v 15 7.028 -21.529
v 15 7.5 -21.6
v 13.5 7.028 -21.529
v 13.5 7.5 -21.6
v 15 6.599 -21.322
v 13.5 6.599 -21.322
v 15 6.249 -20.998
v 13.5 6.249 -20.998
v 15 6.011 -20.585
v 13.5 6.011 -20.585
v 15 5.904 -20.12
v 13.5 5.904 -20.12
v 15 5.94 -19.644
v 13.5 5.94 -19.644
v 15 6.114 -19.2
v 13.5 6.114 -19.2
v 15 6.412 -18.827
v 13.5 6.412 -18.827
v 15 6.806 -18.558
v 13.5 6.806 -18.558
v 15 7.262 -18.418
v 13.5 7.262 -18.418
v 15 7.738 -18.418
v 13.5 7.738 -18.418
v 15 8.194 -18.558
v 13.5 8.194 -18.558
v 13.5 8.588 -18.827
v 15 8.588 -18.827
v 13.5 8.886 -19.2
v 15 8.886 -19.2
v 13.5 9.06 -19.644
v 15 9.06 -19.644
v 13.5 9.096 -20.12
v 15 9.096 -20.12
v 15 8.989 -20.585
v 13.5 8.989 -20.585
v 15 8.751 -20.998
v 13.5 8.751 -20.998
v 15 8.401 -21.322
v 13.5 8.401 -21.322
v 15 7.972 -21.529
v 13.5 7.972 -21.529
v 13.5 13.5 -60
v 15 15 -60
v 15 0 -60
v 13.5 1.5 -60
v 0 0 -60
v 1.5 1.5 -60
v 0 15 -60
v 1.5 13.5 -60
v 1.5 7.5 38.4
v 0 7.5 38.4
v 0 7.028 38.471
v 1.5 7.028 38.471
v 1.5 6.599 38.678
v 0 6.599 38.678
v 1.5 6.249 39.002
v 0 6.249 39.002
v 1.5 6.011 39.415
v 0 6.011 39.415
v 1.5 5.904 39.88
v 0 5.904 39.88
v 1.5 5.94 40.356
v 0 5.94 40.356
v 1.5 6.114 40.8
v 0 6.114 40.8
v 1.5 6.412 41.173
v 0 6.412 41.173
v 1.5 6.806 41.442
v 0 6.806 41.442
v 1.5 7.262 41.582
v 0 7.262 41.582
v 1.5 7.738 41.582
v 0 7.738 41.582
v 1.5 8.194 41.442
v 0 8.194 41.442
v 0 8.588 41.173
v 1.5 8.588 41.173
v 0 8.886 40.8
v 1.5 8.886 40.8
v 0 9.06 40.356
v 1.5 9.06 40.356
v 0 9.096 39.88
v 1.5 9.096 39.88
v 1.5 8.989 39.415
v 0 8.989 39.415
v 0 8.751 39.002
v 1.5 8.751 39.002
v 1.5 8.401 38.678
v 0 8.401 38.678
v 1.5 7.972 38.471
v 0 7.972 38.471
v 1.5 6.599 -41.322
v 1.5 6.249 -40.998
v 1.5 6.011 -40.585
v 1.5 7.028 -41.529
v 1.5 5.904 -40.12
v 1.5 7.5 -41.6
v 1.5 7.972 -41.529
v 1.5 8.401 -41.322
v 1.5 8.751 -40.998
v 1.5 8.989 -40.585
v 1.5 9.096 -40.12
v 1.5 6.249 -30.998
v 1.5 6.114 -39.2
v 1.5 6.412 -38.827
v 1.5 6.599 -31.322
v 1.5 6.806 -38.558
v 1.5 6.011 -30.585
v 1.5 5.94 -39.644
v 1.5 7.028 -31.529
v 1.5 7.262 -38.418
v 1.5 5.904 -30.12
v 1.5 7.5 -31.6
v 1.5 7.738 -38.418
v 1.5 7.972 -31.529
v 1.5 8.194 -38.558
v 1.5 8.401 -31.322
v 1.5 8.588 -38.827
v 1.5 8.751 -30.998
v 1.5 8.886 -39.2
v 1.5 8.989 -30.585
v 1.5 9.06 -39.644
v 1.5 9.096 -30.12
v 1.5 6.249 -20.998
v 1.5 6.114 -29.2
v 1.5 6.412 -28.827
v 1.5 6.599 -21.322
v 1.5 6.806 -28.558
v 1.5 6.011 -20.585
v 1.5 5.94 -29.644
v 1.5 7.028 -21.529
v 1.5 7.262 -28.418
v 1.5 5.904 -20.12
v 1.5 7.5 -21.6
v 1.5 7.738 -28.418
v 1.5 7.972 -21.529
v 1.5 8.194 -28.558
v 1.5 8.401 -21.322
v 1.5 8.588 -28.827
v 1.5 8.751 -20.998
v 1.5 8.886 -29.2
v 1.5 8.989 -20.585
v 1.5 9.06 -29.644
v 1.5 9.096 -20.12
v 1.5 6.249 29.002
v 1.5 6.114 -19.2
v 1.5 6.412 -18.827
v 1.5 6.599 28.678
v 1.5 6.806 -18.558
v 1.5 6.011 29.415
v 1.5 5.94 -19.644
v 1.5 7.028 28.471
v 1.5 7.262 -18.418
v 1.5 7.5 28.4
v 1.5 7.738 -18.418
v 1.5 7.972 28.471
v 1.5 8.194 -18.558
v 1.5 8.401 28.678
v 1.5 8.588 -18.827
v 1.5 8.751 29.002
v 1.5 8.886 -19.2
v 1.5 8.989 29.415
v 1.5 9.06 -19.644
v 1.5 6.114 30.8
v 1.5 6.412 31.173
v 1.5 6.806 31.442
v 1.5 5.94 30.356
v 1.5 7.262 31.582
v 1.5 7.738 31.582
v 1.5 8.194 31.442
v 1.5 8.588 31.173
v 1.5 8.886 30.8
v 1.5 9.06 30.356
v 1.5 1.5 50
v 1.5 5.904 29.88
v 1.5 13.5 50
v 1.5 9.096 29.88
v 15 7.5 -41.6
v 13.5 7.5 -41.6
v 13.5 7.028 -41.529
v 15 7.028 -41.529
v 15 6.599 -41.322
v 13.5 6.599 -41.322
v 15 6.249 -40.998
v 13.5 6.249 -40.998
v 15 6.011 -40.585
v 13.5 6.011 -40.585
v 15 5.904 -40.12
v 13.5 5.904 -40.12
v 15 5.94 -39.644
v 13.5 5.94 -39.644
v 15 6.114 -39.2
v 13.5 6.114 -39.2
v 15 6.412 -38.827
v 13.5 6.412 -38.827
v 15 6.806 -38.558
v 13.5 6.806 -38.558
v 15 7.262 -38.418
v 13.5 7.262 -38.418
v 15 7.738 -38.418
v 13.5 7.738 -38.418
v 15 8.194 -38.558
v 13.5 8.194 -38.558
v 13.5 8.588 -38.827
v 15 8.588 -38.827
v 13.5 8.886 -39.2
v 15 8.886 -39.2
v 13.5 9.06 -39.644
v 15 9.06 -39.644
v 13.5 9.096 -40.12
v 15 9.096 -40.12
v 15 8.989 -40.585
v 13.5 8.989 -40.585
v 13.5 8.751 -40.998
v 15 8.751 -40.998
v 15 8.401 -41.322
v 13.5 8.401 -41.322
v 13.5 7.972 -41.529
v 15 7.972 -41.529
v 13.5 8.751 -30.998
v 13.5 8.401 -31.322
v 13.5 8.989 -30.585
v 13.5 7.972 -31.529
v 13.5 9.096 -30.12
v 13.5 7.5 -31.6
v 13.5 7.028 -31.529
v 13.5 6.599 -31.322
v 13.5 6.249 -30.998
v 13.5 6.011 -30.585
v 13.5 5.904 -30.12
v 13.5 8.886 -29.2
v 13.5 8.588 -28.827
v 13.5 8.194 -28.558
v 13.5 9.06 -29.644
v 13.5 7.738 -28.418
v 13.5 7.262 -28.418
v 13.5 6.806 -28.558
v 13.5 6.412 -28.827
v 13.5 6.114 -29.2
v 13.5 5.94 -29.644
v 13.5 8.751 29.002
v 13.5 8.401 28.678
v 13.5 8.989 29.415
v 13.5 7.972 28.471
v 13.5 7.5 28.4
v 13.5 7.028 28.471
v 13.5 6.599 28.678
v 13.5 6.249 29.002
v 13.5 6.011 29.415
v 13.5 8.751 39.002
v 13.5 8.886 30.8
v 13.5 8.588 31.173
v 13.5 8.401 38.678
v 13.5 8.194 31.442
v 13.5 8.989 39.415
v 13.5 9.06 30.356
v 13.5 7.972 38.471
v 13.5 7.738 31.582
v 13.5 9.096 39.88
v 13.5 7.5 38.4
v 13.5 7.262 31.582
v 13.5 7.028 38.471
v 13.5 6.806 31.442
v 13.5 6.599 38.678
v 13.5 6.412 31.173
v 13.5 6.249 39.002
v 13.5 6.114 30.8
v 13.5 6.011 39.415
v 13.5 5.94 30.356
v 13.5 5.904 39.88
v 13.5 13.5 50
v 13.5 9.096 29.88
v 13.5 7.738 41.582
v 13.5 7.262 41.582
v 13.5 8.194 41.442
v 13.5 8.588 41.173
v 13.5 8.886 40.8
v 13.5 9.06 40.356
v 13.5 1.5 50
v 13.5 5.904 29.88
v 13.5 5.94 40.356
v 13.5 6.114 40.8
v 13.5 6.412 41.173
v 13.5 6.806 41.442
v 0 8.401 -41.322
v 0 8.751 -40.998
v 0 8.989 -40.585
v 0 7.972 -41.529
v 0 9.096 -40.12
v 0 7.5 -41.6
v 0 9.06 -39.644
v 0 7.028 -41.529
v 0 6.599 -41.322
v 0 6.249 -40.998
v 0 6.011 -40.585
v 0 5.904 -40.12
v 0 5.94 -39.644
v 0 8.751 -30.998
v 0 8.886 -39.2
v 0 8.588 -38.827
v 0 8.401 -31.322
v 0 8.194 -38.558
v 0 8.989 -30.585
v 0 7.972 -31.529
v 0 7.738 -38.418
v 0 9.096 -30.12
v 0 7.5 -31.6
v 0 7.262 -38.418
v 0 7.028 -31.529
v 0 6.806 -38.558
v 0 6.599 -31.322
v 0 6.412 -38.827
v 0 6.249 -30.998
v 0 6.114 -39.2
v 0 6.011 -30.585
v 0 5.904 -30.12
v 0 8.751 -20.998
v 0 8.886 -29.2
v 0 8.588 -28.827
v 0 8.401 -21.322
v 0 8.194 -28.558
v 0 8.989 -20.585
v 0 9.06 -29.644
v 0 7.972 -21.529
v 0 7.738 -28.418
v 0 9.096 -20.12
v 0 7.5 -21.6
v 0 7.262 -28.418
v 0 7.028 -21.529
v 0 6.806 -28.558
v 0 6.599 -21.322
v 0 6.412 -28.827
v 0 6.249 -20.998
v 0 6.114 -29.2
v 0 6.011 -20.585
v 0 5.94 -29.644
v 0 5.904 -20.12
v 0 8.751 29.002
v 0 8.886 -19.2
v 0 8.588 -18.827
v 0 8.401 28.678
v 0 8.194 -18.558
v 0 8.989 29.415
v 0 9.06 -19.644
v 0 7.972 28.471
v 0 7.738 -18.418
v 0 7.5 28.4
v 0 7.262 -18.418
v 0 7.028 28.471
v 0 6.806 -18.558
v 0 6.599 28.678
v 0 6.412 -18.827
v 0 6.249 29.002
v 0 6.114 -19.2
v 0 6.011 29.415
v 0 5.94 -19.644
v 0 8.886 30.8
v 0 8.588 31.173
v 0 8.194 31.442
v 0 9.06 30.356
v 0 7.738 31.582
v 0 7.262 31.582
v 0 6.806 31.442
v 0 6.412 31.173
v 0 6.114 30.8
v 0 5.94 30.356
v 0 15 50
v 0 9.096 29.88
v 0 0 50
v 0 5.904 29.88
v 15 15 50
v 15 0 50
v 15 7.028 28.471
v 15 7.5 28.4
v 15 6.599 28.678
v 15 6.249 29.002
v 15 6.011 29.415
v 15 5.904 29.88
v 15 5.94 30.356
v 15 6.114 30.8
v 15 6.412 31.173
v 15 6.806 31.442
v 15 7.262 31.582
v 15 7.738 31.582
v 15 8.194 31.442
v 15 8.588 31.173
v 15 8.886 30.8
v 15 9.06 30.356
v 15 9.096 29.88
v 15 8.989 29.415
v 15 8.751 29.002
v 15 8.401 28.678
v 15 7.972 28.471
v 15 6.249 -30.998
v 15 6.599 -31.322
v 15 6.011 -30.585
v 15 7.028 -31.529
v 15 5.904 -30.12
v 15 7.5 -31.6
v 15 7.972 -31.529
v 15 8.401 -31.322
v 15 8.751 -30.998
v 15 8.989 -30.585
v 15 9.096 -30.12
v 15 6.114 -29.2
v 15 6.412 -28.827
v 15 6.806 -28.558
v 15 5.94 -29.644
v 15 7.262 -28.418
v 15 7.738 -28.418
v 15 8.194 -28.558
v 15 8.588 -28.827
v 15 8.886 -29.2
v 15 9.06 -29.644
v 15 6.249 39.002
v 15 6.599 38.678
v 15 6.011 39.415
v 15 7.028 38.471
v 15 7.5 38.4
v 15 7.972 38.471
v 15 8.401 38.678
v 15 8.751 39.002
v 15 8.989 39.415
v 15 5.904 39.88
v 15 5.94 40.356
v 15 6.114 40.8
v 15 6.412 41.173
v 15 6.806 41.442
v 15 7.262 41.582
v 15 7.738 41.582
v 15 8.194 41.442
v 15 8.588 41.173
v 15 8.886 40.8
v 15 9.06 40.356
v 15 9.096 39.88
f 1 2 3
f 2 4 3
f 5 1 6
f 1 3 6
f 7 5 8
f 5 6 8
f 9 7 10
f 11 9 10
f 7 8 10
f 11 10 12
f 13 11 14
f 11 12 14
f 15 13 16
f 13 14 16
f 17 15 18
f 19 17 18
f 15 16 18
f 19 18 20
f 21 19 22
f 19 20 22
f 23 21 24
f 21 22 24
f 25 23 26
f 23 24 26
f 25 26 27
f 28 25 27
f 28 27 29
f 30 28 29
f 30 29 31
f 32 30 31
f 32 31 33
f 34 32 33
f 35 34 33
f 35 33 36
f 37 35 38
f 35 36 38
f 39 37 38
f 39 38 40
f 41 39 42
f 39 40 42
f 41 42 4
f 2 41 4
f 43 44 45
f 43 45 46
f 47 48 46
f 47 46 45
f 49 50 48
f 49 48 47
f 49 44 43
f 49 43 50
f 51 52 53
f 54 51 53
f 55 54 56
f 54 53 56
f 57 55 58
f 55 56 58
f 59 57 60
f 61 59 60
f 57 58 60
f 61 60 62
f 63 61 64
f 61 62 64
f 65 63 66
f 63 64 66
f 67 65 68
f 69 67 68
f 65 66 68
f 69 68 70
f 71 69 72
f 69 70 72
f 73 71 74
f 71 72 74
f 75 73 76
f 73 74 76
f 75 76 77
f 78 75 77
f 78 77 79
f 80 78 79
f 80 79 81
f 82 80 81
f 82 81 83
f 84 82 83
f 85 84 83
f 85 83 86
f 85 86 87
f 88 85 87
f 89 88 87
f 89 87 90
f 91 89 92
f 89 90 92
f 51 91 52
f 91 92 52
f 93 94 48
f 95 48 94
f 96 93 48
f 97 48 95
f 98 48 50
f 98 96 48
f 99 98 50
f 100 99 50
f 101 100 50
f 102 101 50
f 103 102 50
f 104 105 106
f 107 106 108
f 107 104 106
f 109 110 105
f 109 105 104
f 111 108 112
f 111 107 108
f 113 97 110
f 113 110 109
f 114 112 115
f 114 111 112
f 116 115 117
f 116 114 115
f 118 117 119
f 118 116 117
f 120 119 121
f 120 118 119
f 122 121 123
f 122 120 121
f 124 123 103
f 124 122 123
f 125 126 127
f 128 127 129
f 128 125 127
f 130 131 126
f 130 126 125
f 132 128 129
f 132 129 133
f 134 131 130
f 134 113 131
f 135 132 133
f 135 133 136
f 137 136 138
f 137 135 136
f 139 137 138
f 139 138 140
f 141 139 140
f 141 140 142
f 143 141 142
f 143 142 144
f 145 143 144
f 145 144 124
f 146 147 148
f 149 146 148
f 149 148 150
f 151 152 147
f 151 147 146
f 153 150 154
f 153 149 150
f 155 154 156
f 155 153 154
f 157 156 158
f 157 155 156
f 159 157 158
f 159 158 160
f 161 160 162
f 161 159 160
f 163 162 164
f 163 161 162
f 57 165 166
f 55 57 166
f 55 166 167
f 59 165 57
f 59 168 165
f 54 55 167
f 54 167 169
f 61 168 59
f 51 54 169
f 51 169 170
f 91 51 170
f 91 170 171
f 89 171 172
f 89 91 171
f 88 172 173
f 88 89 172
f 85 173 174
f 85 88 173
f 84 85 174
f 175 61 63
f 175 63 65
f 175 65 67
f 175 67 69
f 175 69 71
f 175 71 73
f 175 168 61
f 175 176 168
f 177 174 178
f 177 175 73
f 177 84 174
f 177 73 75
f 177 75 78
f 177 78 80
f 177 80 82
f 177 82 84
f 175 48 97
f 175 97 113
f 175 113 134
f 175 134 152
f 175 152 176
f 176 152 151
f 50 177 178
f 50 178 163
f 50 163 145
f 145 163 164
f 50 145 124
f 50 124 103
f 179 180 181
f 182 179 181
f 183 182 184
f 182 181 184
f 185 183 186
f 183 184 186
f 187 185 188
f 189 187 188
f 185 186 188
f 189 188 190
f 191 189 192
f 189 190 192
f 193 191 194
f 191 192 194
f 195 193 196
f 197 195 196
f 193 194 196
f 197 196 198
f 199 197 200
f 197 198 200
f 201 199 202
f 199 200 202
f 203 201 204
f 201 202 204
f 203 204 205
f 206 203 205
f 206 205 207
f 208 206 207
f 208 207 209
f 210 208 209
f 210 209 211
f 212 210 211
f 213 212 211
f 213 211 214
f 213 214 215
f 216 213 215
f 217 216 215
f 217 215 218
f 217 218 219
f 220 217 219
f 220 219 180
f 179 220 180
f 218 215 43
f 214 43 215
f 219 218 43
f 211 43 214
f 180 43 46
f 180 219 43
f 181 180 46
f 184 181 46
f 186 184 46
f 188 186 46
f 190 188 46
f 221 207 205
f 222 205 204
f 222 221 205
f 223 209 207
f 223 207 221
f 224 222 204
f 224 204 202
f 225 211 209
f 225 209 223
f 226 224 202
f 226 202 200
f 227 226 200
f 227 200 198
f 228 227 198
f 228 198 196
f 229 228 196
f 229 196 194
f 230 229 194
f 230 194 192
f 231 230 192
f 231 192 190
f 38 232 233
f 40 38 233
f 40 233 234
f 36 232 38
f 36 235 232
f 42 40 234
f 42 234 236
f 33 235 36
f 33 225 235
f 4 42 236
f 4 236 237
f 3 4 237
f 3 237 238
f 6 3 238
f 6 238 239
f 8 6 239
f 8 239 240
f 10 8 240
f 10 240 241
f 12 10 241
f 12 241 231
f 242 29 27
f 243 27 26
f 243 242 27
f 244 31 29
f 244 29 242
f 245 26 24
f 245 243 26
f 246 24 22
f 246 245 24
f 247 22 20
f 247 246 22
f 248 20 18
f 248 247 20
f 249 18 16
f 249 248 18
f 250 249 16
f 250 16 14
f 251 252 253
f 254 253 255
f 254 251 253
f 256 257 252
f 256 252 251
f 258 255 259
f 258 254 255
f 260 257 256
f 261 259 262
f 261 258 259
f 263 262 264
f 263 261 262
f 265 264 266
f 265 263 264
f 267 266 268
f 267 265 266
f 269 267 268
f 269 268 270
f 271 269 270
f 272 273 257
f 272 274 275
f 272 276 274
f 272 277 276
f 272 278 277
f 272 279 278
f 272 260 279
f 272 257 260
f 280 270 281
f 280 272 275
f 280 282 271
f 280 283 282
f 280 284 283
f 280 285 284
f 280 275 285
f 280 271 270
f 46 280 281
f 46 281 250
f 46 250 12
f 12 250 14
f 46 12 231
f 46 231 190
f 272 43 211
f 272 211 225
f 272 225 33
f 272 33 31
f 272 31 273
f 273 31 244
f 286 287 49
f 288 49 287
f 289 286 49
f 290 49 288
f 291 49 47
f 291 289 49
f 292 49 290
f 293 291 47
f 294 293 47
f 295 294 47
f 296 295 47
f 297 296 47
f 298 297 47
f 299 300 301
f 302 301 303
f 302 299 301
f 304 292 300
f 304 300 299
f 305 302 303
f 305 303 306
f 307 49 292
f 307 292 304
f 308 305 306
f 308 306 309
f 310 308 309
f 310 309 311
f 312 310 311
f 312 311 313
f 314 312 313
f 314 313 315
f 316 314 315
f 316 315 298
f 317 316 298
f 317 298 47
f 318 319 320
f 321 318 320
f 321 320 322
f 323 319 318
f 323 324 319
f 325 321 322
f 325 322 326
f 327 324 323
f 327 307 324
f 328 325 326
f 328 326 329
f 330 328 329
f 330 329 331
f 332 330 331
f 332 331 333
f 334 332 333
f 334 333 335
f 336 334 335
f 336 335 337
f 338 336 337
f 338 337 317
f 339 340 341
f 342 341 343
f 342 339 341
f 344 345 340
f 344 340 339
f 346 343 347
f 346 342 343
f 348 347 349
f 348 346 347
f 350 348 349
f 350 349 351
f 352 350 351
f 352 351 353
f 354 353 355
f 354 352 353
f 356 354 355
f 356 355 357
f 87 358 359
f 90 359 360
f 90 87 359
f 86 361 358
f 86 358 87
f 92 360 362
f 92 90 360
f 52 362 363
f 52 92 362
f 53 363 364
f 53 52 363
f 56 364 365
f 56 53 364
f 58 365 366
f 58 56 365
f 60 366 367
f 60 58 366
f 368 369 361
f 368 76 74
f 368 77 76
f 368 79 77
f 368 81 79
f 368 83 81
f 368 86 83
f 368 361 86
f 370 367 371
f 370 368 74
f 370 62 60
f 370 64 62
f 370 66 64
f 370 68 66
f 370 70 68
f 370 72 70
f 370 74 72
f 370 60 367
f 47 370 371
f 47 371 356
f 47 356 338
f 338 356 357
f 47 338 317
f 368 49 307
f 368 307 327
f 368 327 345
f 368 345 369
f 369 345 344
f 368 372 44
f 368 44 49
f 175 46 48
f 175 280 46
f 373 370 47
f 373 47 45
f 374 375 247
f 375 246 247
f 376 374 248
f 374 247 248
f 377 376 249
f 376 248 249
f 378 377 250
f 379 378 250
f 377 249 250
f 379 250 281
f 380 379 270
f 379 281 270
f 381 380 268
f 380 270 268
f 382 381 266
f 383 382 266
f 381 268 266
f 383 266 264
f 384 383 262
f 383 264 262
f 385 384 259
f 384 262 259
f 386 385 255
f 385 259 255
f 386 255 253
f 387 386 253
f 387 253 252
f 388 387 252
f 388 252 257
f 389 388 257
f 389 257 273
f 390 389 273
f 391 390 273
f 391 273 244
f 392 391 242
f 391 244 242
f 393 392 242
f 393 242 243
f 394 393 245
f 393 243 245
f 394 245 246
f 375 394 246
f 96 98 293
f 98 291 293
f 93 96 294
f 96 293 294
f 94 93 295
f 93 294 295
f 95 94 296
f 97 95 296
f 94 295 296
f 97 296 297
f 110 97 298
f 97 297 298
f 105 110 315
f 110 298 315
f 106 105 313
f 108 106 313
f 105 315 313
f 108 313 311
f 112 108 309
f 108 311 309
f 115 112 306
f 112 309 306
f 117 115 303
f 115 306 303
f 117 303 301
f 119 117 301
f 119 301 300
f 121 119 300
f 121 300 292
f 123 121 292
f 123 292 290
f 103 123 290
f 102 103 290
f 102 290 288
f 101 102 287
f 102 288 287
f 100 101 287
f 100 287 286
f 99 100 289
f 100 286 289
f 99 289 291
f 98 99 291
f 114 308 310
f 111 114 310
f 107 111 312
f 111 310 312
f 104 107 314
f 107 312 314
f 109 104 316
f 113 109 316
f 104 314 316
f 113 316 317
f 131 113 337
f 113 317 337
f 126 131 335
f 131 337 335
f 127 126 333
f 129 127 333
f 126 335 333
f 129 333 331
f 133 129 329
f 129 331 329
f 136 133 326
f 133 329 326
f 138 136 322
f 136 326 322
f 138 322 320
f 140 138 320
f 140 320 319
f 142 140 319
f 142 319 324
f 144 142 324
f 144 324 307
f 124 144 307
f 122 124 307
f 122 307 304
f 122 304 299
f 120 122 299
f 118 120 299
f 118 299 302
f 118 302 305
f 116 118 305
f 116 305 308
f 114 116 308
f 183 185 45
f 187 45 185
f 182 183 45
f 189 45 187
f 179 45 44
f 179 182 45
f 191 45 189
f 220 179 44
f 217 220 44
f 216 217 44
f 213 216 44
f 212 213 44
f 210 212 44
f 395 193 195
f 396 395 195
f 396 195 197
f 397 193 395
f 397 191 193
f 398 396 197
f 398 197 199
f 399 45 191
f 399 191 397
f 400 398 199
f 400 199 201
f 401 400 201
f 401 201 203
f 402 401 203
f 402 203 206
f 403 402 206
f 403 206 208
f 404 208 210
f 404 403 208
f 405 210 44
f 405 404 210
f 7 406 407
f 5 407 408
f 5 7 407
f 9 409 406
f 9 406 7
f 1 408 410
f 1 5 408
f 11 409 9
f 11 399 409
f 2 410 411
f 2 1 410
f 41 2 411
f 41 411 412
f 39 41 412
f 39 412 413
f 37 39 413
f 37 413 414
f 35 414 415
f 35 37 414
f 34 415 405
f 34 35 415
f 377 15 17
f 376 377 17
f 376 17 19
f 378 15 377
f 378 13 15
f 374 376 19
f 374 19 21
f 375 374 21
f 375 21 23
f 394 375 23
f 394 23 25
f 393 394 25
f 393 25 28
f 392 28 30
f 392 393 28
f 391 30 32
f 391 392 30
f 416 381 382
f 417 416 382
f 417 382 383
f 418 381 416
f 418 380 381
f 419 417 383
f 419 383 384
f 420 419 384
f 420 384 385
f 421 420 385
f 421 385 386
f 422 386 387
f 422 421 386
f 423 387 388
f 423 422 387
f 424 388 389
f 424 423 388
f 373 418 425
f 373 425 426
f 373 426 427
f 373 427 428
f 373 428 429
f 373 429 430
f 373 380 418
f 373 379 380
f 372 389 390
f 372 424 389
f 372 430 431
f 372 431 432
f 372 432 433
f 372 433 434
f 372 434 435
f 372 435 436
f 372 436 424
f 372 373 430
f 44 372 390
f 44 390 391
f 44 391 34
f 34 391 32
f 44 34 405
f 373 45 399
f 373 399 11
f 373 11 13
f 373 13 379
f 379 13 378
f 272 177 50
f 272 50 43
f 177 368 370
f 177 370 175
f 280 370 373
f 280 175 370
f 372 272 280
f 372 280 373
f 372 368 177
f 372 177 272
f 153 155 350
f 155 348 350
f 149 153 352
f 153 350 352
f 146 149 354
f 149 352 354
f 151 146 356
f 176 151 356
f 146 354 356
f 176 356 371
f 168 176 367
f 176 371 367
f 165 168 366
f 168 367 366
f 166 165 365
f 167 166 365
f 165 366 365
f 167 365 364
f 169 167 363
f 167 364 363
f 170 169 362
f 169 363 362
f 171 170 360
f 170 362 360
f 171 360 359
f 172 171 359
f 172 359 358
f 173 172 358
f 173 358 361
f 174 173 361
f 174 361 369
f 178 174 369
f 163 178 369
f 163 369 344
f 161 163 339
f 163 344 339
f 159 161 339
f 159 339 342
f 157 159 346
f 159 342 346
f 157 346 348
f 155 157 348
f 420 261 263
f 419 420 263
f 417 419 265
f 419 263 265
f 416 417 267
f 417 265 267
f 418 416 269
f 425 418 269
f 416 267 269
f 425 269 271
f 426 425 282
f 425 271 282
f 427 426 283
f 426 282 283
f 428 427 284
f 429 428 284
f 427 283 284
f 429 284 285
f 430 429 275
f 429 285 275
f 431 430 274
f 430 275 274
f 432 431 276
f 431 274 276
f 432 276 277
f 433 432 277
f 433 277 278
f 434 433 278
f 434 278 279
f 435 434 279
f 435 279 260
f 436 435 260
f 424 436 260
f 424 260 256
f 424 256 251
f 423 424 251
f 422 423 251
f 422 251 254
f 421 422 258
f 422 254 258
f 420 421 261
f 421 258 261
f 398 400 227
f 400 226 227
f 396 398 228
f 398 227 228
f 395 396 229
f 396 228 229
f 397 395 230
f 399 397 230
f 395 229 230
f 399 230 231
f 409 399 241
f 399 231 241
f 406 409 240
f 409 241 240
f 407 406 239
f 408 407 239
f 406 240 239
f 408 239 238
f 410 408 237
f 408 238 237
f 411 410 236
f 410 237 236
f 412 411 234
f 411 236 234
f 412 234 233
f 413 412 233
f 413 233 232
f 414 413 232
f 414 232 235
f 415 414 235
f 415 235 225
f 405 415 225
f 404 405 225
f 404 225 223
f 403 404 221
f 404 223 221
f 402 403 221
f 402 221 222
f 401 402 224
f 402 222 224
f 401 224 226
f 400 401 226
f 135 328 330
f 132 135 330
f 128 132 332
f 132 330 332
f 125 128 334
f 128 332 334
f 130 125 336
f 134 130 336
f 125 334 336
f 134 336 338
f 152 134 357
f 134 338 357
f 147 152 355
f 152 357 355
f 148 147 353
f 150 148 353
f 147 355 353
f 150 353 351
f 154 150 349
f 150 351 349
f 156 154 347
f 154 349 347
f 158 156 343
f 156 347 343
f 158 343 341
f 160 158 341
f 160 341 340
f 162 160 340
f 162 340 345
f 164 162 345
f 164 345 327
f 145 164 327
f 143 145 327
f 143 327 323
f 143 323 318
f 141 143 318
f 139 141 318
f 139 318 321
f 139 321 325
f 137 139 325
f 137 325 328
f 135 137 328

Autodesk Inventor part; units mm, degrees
ref_plane "YZ Plane" through (0, 0, 0) normal (1, 0, 0) x (0, 1, 0)
ref_plane "XZ Plane" through (0, 0, 0) normal (0, 1, 0) x (-1, 0, 0)
ref_plane "XY Plane" through (0, 0, 0) normal (0, 0, 1) x (1, 0, 0)
sketch "スケッチ1" plane through (0, 0, 0) normal (0, 0, 1) x (1, 0, 0)
  line L0 (0, 0) -> (15, 0)
  line L1 (15, 0) -> (15, 15)
  line L2 (15, 15) -> (0, 15)
  line L3 (0, 15) -> (0, 0)
  dimension "d0" = 15
  dimension "d1" = 15
extrude "押し出し1" add sketch "スケッチ1" along normal blind 50
sketch "スケッチ3" plane through (0, 0, 0) normal (0, 0, -1) x (-1, 0, 0)
  line L0 (0, 15) -> (0, 0) projected
  line L1 (0, 0) -> (-15, 0)
  line L2 (-15, 0) -> (-15, 15)
  line L3 (-15, 15) -> (0, 15)
  line L4 (0, 15) -> (0, 0)
  dimension "d21" = 15
  dimension "d22" = 15
extrude "押し出し2" add sketch "スケッチ3" along normal blind 135
sketch "スケッチ4" plane through (0, 15, 50) normal (0, 1, 0) x (1, 0, 0)
  line L0 (15, 0) -> (15, 185) projected
  line L1 (15, 185) -> (0, 185)
  line L2 (0, 185) -> (0, 105)
  line L3 (0, 105) -> (15, 105)
  line L4 (15, 105) -> (15, 185)
  point P0 (0, 50)
  dimension "d25" = 15
  dimension "d26" = 80
extrude "押し出し3" cut sketch "スケッチ4" against normal blind 135
sketch "スケッチ5" plane through (15, 15, -55) normal (0, 0, -1) x (-1, 0, 0)
  line L0 (15, 0) -> (15, -15) projected
  line L1 (0, -15) -> (0, 0) projected
  line L2 (15, -15) -> (0, -15)
  line L3 (0, -15) -> (0, 0)
  line L4 (0, 0) -> (15, 0)
  line L5 (15, 0) -> (15, -15)
extrude "押し出し4" add sketch "スケッチ5" along normal blind 15
sketch "スケッチ8" plane through (15, 0, 50) normal (1, 0, 0) x (0, 0, -1)
  line L0 (120, 15) -> (120, 0) projected
  line L1 (120, 15) -> (0, 15) projected
  point P0 (50, 0)
  point P1 (90, 7.5)
  point P2 (80, 7.5)
  point P3 (70, 7.5)
  dimension "d54" = 30
  dimension "d55" = 7.5
  dimension "d56" = 7.5
  dimension "d57" = 7.5
  dimension "d58" = 10
  dimension "d59" = 10
hole "穴4" at (15, 7.5, -40) at (15, 7.5, -30) at (15, 7.5, -20) direction (-1, 0, 0) diameter 3.2 end through all
sketch "スケッチ9" plane through (15, 0, 50) normal (1, 0, 0) x (0, 0, -1)
  line L0 (0, 0) -> (0, 15) projected
  line L1 (0, 0) -> (120, 0) projected
  point P0 (50, 0)
  point P1 (10, 7.5)
  point P2 (20, 7.5)
  dimension "d67" = 10
  dimension "d68" = 10
  dimension "d69" = 7.5
  dimension "d70" = 7.5
hole "穴5" at (15, 7.5, 40) at (15, 7.5, 30) direction (-1, 0, 0) diameter 3.2 end through all
sketch "スケッチ10" plane through (15, 15, -70) normal (0, 0, -1) x (-1, 0, 0)
  line L0 (15, 0) -> (0, 0) projected
  line L1 (15, -15) -> (0, -15)
  line L2 (0, -15) -> (0, 0)
  line L3 (0, 0) -> (15, 0)
  line L4 (15, 0) -> (15, -15)
extrude "押し出し5" cut sketch "スケッチ10" against normal blind 10
sketch "スケッチ11" plane through (0, 0, 50) normal (0, 0, 1) x (1, 0, 0)
  line L0 (1.5, 13.5) -> (13.5, 13.5)
  line L1 (13.5, 13.5) -> (13.5, 1.5)
  line L2 (13.5, 1.5) -> (1.5, 1.5)
  line L3 (1.5, 1.5) -> (1.5, 13.5)
  line L4 (15, 15) -> (0, 15) projected
  line L5 (0, 15) -> (0, 0) projected
  dimension "d80" = 12
  dimension "d81" = 12
  dimension "d82" = 1.5
  dimension "d83" = 1.5
extrude "押し出し6" cut sketch "スケッチ11" against normal blind 140
properties part number "射出_角柱6" material "アルミニウム 6061"
